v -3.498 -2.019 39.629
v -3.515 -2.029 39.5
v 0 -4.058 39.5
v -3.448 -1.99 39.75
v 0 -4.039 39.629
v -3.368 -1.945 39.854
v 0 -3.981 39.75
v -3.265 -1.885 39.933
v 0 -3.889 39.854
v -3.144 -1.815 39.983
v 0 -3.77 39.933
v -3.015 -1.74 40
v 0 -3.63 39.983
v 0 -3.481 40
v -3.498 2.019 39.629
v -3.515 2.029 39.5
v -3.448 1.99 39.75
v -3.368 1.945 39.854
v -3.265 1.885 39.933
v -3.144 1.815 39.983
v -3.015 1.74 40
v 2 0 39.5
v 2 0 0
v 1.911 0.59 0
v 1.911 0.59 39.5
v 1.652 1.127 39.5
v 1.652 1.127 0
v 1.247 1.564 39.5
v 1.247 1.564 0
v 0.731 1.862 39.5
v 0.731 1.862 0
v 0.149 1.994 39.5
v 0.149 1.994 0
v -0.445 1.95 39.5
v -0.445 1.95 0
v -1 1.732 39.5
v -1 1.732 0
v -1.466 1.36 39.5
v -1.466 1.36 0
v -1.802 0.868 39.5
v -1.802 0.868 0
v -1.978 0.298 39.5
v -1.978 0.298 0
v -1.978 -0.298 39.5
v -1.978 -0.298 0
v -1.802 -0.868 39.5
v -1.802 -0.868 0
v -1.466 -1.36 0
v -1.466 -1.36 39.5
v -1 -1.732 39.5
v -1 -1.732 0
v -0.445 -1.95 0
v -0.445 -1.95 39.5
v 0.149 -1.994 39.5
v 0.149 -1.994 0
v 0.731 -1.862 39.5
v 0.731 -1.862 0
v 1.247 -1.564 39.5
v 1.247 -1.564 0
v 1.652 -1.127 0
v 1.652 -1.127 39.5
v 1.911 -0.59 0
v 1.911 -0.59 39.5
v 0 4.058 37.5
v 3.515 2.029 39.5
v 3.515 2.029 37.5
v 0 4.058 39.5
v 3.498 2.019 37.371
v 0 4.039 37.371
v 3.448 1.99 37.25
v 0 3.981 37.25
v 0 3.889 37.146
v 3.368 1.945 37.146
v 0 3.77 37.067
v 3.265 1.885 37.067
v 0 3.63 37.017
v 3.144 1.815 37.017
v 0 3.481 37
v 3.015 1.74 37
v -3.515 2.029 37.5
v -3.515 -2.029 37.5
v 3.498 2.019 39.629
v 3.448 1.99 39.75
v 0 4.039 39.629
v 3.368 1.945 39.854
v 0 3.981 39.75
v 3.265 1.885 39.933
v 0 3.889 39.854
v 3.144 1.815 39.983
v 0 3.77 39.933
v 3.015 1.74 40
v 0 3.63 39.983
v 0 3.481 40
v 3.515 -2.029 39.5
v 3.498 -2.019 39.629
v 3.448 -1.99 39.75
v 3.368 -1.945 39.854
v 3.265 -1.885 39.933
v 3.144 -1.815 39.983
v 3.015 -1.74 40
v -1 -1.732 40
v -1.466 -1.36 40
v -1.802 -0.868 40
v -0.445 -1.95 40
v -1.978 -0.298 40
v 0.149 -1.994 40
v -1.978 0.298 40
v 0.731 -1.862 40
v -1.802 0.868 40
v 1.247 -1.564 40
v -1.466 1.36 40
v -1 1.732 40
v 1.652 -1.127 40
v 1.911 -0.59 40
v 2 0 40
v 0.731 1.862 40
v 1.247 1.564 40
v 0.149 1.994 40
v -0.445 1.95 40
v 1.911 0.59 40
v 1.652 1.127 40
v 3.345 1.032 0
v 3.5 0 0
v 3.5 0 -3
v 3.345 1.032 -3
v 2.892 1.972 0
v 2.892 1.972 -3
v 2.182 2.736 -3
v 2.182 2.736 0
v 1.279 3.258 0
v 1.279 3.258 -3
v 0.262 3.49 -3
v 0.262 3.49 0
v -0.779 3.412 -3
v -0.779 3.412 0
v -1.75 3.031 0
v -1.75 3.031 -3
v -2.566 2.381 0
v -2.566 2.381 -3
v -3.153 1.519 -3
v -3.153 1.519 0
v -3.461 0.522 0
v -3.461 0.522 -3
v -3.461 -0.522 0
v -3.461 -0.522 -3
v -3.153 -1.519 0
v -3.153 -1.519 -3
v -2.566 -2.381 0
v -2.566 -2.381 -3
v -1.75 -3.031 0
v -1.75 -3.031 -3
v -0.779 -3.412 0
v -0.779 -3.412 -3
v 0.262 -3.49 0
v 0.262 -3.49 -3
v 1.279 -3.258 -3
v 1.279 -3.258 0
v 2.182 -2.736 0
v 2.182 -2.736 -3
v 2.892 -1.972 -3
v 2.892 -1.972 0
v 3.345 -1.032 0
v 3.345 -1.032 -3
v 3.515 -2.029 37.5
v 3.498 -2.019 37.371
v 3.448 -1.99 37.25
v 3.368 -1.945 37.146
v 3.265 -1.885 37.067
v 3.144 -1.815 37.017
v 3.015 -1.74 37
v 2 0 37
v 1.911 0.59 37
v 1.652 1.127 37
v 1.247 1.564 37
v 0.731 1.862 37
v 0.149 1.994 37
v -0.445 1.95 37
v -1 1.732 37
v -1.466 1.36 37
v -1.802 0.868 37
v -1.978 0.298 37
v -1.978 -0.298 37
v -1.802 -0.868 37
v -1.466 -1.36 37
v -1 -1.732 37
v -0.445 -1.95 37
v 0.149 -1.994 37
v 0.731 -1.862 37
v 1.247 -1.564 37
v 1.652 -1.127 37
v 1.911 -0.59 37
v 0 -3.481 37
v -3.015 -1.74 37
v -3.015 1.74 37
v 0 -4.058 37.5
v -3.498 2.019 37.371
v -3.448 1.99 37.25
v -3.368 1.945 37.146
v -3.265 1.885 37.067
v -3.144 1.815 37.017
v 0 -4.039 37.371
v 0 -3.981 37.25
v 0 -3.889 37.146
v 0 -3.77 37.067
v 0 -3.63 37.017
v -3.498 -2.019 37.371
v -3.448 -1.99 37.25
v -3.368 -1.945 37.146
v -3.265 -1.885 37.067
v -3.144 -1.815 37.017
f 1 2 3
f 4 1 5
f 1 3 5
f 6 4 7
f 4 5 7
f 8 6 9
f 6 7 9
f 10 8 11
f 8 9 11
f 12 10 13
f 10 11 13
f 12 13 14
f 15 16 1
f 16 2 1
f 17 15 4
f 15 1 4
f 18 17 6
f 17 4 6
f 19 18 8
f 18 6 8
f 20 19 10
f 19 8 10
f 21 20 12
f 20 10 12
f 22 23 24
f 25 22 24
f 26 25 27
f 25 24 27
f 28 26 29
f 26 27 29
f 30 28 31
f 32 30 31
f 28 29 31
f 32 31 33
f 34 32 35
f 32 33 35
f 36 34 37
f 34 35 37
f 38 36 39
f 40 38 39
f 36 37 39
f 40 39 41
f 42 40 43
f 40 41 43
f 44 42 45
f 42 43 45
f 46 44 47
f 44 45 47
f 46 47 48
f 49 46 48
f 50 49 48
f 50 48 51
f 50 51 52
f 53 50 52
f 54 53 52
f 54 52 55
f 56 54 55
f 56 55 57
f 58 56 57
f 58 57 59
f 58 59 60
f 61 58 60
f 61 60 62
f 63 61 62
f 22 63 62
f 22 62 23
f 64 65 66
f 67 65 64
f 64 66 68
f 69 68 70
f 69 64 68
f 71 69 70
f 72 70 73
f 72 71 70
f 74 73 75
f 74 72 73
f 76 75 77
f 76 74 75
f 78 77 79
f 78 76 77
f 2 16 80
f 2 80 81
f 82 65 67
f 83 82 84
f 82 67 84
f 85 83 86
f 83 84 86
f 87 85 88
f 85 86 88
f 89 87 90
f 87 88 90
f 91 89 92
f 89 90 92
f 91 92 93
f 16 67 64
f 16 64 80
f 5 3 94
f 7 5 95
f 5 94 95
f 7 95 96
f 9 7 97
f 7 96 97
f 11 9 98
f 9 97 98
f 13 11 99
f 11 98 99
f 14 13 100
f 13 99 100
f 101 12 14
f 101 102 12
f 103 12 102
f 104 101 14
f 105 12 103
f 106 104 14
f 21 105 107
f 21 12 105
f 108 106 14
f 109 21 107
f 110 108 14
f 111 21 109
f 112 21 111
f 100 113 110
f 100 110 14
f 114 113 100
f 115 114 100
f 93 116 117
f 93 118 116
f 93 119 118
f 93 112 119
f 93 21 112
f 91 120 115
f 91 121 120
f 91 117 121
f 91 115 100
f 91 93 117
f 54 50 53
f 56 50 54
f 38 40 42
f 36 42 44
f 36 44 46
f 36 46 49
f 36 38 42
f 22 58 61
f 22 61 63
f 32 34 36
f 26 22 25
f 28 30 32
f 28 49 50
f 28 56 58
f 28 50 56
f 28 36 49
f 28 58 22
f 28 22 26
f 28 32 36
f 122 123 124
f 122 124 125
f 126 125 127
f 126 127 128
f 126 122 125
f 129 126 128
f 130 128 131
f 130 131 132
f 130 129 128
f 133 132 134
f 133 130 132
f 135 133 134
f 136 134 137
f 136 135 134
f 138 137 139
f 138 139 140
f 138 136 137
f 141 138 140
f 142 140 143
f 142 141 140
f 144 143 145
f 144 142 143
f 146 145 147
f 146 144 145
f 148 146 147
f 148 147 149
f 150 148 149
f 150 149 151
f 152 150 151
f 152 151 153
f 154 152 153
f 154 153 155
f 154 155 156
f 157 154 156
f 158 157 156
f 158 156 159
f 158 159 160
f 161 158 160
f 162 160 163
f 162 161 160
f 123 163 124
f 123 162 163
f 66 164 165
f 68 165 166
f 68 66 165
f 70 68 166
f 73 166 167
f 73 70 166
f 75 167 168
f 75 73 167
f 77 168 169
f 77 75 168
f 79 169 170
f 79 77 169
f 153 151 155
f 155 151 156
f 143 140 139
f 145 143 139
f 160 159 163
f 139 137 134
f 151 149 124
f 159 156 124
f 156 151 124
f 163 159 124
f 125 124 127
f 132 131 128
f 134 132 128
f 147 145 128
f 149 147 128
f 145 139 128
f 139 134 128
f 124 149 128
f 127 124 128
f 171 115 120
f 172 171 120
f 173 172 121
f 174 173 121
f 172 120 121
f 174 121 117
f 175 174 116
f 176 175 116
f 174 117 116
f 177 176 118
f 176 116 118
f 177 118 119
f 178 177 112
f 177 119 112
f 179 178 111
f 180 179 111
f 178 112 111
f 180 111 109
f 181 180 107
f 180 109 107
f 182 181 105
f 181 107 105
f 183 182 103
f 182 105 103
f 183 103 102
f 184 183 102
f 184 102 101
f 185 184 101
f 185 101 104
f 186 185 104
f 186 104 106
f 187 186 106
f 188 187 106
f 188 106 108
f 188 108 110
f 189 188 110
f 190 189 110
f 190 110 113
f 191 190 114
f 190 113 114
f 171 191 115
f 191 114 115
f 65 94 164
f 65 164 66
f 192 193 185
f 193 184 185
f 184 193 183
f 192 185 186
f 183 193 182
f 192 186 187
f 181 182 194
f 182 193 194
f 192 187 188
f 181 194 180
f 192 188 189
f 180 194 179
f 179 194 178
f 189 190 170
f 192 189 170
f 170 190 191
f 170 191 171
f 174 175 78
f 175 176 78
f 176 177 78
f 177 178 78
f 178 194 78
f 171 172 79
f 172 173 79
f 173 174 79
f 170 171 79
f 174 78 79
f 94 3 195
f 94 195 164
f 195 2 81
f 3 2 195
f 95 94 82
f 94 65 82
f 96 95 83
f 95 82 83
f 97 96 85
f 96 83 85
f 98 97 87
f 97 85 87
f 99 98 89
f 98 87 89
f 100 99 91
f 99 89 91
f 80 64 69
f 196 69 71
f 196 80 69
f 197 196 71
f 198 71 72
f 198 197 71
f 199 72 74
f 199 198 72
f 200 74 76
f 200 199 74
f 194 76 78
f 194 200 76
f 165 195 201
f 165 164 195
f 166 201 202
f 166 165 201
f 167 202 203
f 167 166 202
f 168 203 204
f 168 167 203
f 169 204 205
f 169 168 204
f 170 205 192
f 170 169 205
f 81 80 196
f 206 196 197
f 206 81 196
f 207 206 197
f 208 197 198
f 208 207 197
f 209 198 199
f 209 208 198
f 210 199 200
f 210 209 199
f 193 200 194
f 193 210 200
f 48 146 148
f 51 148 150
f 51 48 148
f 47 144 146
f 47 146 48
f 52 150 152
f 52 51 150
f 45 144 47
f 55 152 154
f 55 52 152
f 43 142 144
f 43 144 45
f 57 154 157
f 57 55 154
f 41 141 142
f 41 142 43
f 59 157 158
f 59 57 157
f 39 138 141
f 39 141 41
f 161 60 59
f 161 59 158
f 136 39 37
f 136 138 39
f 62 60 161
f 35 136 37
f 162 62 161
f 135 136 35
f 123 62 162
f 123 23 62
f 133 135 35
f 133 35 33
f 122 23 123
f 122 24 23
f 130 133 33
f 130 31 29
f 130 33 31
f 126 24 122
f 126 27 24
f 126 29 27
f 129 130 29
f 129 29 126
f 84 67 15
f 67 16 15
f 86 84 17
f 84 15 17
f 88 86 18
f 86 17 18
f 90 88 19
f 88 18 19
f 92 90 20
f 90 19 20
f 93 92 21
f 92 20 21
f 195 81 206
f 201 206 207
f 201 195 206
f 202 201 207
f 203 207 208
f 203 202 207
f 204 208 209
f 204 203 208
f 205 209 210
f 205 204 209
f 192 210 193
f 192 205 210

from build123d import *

# Parameters (mm, degrees)
F0_R     = 2
F1_DEPTH = 40
F0_R_2   = 3.5
F2_DEPTH = 3
F3_R     = 2
F4_DEPTH = 3
F5_DEPTH = 0.5
F6_R     = 0.5


with BuildPart() as f1:
    # F0 (on Top) → F1 (new body)
    with BuildSketch(Plane.XY):
        Circle(F0_R)
    extrude(amount=F1_DEPTH)

    # F0 (on Top) → F2 (join)
    with BuildSketch(Plane.XY):
        Circle(F0_R_2)
        Circle(F0_R, mode=Mode.SUBTRACT)
        Circle(F0_R)
    extrude(amount=-F2_DEPTH)

    # F3 (on face) → F5 (cut)
    with BuildSketch(Plane.XY.offset(40)):
        Circle(F3_R)
    extrude(amount=-F5_DEPTH, mode=Mode.SUBTRACT)


with BuildPart() as f4:
    # F3 (on face) → F4 (new body)
    with BuildSketch(Plane.XY.offset(40)):
        Polygon((3.514565, -2.029135), (3.514565, 2.029135), (0, 4.05827), (-3.514565, 2.029135), (-3.514565, -2.029135), (0, -4.05827), align=None)
        Circle(F3_R, mode=Mode.SUBTRACT)
    extrude(amount=-F4_DEPTH)

    # F6
    f6_edges = [f4.edges().sort_by_distance(p)[0] for p in [
        (3.514565, 0, 40),
        (1.757282, 3.043702, 40),
        (-1.757282, 3.043702, 40),
        (-3.514565, 0, 40),
        (-1.757282, -3.043702, 40),
        (1.757282, -3.043702, 40),
        (1.757282, -3.043702, 37),
        (-1.757282, -3.043702, 37),
        (-3.514565, 0, 37),
        (-1.757282, 3.043702, 37),
        (1.757282, 3.043702, 37),
        (3.514565, 0, 37),
    ]]
    fillet(f6_edges, radius=F6_R)


solid = Compound([f1.part, f4.part])
